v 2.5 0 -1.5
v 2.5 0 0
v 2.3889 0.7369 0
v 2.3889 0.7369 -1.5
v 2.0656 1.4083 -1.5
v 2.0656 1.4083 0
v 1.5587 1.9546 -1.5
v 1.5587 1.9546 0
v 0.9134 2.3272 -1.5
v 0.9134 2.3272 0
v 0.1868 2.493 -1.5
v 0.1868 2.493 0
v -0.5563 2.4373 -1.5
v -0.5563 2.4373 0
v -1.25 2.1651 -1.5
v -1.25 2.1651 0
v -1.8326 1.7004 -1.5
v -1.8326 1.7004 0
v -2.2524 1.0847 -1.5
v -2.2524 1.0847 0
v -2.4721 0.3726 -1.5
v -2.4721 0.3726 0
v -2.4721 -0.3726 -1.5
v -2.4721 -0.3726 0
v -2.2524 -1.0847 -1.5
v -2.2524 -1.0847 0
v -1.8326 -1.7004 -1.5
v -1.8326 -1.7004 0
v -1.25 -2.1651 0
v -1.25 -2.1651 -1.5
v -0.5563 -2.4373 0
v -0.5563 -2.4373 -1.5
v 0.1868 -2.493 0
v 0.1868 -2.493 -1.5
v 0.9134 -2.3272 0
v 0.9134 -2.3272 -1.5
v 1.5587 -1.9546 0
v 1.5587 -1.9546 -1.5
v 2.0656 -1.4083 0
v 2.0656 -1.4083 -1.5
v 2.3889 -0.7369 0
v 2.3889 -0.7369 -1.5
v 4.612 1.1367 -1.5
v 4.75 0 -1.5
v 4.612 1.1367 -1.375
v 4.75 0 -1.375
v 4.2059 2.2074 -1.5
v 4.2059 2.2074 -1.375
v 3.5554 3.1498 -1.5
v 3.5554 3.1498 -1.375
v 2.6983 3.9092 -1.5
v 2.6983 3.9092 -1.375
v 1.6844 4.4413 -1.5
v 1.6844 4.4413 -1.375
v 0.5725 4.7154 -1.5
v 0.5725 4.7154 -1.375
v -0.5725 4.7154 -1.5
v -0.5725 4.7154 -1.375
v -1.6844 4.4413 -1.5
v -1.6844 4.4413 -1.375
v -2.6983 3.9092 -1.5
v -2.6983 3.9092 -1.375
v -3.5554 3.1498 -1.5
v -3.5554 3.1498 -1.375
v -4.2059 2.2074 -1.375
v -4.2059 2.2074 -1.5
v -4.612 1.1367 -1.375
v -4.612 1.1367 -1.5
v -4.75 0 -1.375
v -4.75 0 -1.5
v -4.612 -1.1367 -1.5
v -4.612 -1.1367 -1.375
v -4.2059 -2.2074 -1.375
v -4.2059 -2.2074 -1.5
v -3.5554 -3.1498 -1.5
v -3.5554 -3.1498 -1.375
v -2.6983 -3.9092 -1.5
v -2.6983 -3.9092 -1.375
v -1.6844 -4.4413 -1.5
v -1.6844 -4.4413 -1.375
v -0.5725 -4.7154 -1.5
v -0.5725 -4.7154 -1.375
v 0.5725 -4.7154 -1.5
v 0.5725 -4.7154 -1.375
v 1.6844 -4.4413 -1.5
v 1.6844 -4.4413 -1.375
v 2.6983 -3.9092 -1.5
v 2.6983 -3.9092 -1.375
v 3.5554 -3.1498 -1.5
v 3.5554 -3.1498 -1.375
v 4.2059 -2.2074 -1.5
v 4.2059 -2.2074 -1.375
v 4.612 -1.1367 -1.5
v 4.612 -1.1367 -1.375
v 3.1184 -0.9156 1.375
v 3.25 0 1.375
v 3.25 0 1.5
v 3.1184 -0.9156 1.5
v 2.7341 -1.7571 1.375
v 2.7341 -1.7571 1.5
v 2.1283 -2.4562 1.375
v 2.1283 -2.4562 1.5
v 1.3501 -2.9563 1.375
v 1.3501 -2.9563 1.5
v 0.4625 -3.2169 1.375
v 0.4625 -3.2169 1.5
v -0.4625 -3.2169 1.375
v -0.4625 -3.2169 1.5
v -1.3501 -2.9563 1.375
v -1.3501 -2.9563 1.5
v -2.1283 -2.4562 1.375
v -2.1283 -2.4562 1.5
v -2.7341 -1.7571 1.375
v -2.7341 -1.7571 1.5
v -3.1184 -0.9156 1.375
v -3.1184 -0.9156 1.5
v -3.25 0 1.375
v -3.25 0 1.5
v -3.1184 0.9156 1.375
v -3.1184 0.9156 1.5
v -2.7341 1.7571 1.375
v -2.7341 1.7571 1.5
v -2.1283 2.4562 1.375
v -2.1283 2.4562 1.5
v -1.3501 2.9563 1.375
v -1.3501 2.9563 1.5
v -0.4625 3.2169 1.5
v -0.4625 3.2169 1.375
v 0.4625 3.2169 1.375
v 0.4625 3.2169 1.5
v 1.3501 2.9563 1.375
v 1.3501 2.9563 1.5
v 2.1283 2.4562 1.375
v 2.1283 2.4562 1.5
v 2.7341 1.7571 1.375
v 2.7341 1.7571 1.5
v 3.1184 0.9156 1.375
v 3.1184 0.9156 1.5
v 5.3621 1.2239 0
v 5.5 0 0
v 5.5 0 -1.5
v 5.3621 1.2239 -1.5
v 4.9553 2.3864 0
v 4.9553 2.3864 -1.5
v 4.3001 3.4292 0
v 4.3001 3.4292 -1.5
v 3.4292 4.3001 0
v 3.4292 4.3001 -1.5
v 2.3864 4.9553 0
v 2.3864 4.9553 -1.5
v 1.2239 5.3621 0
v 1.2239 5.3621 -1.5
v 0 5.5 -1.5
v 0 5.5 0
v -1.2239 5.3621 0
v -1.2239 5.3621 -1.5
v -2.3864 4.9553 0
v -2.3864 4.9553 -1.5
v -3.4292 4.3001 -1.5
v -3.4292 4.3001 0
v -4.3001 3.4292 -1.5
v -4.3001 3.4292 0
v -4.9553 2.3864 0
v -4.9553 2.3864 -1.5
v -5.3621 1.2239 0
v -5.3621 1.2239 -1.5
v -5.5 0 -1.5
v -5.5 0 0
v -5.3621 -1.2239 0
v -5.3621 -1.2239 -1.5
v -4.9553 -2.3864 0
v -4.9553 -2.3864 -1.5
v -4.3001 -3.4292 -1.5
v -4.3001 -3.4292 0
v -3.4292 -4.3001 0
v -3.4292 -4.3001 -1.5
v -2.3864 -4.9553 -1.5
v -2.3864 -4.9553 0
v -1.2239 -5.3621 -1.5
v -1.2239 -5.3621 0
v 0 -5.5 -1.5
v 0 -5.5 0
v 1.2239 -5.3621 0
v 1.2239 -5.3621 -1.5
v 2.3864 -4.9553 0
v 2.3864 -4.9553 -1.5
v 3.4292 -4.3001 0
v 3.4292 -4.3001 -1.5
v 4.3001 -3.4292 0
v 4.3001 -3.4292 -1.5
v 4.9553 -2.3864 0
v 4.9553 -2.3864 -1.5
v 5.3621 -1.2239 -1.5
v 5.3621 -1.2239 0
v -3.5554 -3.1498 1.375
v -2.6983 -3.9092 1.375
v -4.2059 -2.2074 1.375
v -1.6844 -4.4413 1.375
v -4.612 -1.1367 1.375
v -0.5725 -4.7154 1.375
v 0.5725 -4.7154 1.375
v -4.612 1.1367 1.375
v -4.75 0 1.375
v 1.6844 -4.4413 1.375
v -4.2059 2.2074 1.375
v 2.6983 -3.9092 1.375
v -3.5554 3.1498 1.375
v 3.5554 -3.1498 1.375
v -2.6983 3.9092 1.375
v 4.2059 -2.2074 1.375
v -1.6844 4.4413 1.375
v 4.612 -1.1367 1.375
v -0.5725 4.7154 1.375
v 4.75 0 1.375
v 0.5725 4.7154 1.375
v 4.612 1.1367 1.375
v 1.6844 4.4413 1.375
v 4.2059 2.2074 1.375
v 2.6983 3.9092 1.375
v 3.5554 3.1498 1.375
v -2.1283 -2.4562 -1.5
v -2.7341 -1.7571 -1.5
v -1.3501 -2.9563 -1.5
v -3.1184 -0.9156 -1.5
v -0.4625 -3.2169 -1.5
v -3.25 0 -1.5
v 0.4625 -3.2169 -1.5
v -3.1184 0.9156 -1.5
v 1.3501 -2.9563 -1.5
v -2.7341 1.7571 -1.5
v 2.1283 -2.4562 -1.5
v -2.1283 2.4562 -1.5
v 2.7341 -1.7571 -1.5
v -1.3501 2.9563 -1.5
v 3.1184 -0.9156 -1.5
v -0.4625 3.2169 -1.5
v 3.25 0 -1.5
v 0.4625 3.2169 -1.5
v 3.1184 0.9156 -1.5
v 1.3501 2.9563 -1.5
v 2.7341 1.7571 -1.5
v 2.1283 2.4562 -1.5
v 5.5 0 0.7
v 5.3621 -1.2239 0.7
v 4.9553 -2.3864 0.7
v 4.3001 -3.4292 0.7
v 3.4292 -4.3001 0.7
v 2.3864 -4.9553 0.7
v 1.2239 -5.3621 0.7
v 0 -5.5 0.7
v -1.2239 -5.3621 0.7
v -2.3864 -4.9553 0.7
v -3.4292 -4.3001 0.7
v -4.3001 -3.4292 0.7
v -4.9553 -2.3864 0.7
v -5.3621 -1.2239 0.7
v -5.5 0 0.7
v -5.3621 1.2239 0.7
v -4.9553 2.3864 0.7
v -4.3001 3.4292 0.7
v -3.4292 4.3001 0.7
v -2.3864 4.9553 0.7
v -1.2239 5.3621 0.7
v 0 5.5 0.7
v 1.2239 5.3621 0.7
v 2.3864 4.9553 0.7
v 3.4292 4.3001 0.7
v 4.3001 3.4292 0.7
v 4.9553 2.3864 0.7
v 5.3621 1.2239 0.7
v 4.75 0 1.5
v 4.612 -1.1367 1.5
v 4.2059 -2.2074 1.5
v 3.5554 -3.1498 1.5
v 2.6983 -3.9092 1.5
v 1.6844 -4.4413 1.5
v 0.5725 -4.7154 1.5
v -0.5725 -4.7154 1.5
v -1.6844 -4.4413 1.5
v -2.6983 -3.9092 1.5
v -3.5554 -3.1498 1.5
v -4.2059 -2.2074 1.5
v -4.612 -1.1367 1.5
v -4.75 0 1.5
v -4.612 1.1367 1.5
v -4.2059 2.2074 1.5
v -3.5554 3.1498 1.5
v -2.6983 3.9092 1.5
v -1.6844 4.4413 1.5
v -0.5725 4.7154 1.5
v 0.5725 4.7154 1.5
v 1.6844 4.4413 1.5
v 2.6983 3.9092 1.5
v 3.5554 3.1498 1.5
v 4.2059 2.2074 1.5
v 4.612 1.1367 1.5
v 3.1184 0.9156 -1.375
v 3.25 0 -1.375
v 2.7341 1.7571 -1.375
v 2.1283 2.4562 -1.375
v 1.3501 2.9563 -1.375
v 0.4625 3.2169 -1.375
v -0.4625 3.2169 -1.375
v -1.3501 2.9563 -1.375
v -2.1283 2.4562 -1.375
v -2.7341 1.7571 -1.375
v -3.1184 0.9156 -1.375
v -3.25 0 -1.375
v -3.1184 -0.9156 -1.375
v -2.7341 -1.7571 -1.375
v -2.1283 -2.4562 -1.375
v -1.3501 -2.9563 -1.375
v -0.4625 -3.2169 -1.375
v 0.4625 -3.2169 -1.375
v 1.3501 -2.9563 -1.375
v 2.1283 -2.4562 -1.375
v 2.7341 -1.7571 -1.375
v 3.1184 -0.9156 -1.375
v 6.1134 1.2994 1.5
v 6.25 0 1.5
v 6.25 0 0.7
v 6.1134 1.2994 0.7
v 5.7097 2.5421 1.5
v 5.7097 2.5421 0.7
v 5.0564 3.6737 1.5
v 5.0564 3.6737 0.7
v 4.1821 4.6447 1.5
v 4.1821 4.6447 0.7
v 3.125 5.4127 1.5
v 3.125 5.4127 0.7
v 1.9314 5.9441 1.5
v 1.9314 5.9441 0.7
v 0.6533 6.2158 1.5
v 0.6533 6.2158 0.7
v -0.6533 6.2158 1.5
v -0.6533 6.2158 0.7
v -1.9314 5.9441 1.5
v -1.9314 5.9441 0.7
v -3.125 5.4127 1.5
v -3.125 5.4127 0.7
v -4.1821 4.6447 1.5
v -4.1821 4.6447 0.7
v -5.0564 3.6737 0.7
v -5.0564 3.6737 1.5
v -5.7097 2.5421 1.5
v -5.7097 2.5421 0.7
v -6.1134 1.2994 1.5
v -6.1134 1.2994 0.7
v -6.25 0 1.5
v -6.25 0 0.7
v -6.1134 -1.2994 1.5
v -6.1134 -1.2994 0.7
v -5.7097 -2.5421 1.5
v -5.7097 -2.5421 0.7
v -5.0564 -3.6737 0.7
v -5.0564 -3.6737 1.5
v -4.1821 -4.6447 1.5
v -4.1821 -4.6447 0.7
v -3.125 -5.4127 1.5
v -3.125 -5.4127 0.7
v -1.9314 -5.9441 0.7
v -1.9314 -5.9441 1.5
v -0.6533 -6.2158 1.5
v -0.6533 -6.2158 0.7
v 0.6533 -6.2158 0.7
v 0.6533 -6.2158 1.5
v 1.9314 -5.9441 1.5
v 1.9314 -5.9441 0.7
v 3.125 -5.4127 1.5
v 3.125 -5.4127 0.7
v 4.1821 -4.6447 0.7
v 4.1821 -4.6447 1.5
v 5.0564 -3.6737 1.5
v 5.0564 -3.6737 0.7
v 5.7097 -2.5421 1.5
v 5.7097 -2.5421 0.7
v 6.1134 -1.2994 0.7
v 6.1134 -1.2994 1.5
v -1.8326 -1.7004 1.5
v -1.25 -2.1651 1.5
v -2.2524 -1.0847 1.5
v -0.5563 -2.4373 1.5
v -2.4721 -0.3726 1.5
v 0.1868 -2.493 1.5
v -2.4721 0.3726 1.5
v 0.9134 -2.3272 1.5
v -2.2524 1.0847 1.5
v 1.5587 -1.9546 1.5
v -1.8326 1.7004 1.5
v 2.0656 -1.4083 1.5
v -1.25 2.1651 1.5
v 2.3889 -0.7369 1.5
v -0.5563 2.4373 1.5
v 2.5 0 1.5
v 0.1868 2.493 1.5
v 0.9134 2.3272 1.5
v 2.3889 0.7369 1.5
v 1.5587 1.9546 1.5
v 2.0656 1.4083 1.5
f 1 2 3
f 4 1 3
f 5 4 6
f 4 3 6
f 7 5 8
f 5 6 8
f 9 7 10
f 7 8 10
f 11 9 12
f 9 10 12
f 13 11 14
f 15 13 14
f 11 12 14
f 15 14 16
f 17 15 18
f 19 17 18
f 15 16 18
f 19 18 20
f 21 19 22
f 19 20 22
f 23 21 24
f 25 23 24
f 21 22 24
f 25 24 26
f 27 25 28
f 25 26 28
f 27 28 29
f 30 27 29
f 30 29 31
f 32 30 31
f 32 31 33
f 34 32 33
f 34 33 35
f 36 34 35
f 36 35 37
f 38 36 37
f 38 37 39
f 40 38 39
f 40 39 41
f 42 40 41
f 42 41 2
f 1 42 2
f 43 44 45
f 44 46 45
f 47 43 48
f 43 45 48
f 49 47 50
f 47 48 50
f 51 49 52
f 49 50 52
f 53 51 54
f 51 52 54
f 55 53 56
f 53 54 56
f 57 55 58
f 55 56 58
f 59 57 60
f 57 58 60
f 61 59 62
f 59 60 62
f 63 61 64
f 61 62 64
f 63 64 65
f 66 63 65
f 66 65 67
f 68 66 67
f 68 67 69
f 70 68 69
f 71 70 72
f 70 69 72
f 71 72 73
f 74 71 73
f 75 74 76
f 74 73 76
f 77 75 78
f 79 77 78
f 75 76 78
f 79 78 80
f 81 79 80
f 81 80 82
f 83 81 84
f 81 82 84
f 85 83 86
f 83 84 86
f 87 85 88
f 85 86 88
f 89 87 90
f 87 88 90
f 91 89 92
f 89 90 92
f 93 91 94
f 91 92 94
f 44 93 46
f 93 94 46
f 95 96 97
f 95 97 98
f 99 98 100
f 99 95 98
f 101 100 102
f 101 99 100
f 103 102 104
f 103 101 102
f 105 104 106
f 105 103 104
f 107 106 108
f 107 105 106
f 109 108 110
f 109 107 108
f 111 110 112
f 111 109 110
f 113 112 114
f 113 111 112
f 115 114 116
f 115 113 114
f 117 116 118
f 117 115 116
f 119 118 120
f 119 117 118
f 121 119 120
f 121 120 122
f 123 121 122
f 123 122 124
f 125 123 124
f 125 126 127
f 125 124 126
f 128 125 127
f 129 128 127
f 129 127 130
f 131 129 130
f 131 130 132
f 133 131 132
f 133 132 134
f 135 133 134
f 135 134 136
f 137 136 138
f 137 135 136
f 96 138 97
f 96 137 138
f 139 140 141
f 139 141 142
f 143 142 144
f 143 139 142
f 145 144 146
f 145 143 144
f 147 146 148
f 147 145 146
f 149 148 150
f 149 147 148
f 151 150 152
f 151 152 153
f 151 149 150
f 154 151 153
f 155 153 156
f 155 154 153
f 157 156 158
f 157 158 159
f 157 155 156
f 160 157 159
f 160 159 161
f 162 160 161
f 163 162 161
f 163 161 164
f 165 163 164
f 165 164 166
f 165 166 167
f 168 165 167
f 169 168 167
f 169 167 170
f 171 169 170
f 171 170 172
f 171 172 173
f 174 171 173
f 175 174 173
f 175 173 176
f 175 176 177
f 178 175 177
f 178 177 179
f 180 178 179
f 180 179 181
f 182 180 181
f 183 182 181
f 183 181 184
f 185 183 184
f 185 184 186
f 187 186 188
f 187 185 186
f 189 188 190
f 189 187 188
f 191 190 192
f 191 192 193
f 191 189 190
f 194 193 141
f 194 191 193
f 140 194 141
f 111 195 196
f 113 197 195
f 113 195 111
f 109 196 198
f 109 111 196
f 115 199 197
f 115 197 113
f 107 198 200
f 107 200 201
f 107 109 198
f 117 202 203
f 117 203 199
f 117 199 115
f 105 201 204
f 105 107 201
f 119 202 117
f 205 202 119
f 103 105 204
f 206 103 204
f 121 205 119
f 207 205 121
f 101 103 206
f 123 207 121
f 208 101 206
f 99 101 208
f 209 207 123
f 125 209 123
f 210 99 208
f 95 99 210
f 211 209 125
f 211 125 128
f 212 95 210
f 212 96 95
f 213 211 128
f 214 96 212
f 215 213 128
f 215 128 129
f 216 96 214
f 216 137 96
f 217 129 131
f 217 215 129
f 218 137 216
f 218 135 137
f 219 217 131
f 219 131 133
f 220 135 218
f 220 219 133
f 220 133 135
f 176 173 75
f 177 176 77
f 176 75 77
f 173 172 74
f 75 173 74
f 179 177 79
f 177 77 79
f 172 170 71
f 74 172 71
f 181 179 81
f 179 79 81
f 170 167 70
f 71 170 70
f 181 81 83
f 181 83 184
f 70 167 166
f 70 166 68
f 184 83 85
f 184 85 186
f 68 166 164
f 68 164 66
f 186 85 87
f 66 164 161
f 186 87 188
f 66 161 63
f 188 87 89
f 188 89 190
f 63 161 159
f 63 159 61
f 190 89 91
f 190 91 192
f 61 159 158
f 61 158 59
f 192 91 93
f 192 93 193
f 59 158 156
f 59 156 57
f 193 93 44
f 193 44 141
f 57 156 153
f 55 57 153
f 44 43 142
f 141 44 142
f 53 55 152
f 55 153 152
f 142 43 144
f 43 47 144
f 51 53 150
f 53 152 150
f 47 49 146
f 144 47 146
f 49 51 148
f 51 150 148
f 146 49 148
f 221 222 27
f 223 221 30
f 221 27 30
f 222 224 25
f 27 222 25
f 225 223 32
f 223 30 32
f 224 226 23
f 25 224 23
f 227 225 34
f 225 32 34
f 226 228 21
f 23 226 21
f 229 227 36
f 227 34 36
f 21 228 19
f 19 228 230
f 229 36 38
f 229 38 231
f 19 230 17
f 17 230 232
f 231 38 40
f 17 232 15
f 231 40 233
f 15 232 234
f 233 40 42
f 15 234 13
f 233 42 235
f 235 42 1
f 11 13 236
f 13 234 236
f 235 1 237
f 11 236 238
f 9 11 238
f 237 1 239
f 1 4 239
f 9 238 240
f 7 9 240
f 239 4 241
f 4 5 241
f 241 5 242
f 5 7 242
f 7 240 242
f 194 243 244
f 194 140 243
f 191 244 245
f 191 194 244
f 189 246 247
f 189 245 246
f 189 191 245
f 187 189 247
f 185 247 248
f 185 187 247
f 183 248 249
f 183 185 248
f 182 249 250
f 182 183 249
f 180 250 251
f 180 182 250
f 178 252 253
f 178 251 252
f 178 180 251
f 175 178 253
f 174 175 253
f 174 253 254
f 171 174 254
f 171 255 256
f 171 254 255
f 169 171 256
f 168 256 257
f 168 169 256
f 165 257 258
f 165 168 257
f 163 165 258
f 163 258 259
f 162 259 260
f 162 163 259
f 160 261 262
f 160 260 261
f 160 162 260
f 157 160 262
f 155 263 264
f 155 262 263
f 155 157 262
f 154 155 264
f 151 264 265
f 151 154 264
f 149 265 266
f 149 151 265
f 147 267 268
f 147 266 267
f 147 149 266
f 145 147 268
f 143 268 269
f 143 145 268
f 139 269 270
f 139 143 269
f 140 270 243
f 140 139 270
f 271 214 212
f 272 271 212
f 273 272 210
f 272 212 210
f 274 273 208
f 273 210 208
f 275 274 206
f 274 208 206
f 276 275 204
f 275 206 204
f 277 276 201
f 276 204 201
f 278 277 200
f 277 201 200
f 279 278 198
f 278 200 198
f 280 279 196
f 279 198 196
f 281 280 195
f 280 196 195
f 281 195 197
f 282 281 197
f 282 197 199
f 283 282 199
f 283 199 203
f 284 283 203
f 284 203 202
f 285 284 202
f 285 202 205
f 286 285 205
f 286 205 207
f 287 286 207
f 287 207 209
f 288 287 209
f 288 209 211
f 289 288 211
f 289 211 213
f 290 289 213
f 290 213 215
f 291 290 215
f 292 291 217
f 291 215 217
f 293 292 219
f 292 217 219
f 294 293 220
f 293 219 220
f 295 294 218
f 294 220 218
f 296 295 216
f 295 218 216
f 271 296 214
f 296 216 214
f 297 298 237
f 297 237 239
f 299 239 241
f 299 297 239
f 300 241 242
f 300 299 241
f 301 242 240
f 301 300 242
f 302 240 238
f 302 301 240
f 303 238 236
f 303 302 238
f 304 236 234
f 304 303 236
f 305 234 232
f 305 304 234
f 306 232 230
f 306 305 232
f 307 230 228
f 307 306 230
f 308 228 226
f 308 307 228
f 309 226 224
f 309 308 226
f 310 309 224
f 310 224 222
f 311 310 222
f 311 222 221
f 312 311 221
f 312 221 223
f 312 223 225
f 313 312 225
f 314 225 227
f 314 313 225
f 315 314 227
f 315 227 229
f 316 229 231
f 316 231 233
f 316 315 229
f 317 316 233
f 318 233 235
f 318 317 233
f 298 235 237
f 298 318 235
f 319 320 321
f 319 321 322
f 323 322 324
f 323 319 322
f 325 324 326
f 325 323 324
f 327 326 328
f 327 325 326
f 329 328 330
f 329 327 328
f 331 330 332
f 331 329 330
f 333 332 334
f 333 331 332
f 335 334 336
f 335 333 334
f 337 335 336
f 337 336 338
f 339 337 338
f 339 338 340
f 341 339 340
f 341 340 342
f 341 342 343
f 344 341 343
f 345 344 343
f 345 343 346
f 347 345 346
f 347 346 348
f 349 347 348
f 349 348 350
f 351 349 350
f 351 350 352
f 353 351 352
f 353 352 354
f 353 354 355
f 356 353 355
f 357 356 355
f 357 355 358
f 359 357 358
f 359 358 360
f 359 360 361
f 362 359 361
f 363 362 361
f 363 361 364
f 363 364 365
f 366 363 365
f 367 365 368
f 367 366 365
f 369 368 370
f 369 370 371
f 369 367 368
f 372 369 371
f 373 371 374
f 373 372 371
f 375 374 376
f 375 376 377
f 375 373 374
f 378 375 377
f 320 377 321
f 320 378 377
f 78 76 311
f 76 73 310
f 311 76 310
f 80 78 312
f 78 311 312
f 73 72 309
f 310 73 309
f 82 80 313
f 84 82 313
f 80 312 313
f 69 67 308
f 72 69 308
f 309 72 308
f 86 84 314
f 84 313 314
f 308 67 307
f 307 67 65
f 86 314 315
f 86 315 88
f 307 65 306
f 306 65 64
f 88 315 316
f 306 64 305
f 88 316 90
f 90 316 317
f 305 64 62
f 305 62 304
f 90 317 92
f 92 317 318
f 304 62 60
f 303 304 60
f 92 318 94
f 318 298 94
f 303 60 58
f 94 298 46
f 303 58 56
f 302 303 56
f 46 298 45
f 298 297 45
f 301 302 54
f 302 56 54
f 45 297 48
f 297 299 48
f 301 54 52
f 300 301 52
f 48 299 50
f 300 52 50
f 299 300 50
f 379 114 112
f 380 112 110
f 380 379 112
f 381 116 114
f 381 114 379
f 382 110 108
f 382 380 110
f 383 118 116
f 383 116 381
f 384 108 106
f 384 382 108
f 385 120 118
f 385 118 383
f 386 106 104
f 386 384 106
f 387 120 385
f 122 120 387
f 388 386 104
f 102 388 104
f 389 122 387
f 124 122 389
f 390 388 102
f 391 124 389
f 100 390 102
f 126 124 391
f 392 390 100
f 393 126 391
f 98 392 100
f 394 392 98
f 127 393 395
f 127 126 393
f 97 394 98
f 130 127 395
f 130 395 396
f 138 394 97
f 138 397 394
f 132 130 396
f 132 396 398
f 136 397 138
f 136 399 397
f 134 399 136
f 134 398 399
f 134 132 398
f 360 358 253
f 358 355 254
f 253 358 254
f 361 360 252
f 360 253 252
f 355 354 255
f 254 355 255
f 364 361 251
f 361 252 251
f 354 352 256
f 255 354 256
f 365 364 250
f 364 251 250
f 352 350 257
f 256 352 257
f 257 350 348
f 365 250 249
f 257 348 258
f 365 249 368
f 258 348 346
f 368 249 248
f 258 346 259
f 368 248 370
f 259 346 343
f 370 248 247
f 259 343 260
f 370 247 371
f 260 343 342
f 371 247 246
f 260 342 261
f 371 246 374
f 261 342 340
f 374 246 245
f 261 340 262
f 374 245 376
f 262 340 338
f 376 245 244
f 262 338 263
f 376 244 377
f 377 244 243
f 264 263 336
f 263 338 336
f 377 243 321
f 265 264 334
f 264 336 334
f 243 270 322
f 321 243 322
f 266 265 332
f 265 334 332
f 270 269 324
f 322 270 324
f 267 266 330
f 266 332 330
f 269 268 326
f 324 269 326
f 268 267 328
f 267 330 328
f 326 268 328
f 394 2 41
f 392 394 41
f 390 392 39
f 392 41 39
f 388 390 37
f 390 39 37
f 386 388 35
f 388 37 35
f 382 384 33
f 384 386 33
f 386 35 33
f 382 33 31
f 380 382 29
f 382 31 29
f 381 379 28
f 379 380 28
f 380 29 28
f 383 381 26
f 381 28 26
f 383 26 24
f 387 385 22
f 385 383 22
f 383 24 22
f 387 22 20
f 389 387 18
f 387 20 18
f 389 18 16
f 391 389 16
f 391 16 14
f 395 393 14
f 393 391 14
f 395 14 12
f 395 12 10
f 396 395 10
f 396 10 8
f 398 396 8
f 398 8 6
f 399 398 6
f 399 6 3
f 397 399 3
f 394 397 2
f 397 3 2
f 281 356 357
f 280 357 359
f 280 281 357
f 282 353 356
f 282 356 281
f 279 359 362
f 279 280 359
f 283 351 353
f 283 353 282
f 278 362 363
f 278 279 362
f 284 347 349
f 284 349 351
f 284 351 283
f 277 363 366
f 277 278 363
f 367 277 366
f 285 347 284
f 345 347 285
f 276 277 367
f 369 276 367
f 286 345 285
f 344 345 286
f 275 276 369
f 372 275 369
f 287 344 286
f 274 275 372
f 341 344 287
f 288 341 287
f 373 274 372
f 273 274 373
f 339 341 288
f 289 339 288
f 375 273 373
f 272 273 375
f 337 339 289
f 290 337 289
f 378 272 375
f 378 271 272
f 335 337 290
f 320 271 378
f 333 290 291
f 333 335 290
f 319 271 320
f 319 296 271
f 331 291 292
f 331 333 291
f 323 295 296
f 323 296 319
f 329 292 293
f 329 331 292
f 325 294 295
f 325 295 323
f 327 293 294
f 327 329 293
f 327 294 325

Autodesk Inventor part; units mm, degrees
ref_plane "YZ Plane" through (0, 0, 0) normal (1, 0, 0) x (0, 1, 0)
ref_plane "XZ Plane" through (0, 0, 0) normal (0, 1, 0) x (-1, 0, 0)
ref_plane "XY Plane" through (0, 0, 0) normal (0, 0, 1) x (1, 0, 0)
sketch "Sketch1" plane through (0, 0, 0) normal (0, 0, 1) x (1, 0, 0)
  circle A0 centre (0, 0) radius 2.5
  circle A1 centre (0, 0) radius 5.5
  circle A2 centre (0, 0) radius 4.75
  circle A3 centre (0, 0) radius 3.25
  dimension "d0" = 5
  dimension "d1" = 11
  dimension "d2" = 0.75
  dimension "d3" = 0.75
extrude "Extrusion1" add sketch "Sketch1" along normal mid plane 3
extrude "Extrusion2" add sketch "Sketch1" along normal mid plane 2.75 contours A2
sketch "Sketch2" plane through (0, 0, 1.5) normal (0, 0, 1) x (1, 0, 0)
  circle A0 centre (0, 0) radius 5.5 projected
  circle A1 centre (0, 0) radius 6.25
  dimension "d8" = 12.5
extrude "Extrusion3" add sketch "Sketch2" against normal blind 0.8
properties part number "F685ZZ" material "Steel, Carbon"
